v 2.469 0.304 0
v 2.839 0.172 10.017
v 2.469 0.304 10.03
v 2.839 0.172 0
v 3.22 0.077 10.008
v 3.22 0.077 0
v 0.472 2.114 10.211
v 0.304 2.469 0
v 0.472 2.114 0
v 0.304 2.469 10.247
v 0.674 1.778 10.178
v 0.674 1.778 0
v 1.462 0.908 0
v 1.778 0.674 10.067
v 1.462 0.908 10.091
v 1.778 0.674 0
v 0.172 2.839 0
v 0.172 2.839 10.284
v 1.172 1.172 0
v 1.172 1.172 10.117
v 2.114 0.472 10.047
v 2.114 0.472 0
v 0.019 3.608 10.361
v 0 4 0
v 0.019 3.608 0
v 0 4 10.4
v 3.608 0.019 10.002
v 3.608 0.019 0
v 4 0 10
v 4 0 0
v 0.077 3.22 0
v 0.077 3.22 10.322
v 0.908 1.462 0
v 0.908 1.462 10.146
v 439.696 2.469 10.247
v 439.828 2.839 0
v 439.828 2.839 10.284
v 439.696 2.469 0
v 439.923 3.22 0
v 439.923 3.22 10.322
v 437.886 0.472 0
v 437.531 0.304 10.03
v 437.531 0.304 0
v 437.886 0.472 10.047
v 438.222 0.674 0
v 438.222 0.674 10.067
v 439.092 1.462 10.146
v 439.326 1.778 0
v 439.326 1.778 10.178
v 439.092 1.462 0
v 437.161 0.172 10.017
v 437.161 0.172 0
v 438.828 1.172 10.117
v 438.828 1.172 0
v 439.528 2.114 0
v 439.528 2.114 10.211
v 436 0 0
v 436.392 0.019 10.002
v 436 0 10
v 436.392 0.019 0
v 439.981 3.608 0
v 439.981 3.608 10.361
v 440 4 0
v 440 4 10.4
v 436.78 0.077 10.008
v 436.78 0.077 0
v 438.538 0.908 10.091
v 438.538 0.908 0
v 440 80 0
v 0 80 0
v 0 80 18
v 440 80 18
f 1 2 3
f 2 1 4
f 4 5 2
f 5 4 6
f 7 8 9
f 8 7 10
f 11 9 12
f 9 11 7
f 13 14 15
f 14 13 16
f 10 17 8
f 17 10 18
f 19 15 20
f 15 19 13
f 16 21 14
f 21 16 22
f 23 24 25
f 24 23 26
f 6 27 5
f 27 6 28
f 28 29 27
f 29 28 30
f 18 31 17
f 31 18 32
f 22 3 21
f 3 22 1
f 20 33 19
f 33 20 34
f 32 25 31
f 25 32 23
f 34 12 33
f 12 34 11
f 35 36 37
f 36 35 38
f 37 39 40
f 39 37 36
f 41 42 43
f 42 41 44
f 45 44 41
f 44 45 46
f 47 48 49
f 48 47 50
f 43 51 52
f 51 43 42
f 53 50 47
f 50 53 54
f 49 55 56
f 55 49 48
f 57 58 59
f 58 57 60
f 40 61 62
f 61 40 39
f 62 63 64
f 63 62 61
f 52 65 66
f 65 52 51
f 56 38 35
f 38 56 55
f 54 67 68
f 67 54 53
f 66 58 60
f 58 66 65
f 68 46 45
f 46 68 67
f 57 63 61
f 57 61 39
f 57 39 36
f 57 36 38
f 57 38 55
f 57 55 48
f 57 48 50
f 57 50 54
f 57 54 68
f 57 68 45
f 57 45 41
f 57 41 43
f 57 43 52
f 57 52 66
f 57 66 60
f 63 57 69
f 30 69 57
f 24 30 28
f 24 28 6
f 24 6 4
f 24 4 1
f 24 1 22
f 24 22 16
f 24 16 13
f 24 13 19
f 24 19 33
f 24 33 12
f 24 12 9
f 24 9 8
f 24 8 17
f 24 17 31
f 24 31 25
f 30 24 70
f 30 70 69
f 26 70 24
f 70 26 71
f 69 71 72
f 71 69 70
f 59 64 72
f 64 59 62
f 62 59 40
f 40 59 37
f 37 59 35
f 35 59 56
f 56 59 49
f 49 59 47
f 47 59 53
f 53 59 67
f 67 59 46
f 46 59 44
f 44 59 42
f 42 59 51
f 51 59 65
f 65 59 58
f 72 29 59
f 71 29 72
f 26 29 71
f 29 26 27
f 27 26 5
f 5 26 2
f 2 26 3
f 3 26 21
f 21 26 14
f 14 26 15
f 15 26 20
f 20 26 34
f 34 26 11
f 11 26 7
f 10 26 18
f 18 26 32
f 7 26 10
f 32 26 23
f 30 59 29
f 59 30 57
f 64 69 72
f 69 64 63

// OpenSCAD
/*
A (Parametric) Keyboard Wrist Rest
by Mike Kasberg

Default size optimized for WASD tenkeyless keyboards.

Tip: Print upside down for a smooth top and slightly rough/grippy bottom!

Use your slicer to cut for printing if needed.
https://help.prusa3d.com/article/cut-tool_1779
*/

// COMMON LENGTHS:
// 61-key      290
// Tenkeyless  360
// Full        440


// The height of the front of the wrist rest.
front_height =10;
// The height of the back of the wrist rest. Typically slightly larger than front height.
back_height = 18;
// The depth (front to back) of the wrist rest.
depth = 80;
// The length of the wrist rest in the longest direction.
length = 440;

// Radius of the rounded front corners
corner_radius = 4;


module wrist_rest() {
  translate([length, depth, 0]) rotate([0, 0, -90]) rotate([90, 0, 0]) {
    linear_extrude(height = length) {
      polygon([[0, 0], [depth, 0], [depth, front_height], [0, back_height]]);
    }
  }
}

module corner_cut() {
  difference() {
    translate([0, 0, (back_height / 2)])
      cube([2 * corner_radius, 2 * corner_radius, back_height + 2], center = true);
    translate([corner_radius, corner_radius, -1.1])
      cylinder(h = back_height + 2.2, r = corner_radius, $fn=64);
  }
}

difference() {
  wrist_rest();
  corner_cut();
  translate([length, 0, 0]) rotate([0, 0, 90]) corner_cut();
}
